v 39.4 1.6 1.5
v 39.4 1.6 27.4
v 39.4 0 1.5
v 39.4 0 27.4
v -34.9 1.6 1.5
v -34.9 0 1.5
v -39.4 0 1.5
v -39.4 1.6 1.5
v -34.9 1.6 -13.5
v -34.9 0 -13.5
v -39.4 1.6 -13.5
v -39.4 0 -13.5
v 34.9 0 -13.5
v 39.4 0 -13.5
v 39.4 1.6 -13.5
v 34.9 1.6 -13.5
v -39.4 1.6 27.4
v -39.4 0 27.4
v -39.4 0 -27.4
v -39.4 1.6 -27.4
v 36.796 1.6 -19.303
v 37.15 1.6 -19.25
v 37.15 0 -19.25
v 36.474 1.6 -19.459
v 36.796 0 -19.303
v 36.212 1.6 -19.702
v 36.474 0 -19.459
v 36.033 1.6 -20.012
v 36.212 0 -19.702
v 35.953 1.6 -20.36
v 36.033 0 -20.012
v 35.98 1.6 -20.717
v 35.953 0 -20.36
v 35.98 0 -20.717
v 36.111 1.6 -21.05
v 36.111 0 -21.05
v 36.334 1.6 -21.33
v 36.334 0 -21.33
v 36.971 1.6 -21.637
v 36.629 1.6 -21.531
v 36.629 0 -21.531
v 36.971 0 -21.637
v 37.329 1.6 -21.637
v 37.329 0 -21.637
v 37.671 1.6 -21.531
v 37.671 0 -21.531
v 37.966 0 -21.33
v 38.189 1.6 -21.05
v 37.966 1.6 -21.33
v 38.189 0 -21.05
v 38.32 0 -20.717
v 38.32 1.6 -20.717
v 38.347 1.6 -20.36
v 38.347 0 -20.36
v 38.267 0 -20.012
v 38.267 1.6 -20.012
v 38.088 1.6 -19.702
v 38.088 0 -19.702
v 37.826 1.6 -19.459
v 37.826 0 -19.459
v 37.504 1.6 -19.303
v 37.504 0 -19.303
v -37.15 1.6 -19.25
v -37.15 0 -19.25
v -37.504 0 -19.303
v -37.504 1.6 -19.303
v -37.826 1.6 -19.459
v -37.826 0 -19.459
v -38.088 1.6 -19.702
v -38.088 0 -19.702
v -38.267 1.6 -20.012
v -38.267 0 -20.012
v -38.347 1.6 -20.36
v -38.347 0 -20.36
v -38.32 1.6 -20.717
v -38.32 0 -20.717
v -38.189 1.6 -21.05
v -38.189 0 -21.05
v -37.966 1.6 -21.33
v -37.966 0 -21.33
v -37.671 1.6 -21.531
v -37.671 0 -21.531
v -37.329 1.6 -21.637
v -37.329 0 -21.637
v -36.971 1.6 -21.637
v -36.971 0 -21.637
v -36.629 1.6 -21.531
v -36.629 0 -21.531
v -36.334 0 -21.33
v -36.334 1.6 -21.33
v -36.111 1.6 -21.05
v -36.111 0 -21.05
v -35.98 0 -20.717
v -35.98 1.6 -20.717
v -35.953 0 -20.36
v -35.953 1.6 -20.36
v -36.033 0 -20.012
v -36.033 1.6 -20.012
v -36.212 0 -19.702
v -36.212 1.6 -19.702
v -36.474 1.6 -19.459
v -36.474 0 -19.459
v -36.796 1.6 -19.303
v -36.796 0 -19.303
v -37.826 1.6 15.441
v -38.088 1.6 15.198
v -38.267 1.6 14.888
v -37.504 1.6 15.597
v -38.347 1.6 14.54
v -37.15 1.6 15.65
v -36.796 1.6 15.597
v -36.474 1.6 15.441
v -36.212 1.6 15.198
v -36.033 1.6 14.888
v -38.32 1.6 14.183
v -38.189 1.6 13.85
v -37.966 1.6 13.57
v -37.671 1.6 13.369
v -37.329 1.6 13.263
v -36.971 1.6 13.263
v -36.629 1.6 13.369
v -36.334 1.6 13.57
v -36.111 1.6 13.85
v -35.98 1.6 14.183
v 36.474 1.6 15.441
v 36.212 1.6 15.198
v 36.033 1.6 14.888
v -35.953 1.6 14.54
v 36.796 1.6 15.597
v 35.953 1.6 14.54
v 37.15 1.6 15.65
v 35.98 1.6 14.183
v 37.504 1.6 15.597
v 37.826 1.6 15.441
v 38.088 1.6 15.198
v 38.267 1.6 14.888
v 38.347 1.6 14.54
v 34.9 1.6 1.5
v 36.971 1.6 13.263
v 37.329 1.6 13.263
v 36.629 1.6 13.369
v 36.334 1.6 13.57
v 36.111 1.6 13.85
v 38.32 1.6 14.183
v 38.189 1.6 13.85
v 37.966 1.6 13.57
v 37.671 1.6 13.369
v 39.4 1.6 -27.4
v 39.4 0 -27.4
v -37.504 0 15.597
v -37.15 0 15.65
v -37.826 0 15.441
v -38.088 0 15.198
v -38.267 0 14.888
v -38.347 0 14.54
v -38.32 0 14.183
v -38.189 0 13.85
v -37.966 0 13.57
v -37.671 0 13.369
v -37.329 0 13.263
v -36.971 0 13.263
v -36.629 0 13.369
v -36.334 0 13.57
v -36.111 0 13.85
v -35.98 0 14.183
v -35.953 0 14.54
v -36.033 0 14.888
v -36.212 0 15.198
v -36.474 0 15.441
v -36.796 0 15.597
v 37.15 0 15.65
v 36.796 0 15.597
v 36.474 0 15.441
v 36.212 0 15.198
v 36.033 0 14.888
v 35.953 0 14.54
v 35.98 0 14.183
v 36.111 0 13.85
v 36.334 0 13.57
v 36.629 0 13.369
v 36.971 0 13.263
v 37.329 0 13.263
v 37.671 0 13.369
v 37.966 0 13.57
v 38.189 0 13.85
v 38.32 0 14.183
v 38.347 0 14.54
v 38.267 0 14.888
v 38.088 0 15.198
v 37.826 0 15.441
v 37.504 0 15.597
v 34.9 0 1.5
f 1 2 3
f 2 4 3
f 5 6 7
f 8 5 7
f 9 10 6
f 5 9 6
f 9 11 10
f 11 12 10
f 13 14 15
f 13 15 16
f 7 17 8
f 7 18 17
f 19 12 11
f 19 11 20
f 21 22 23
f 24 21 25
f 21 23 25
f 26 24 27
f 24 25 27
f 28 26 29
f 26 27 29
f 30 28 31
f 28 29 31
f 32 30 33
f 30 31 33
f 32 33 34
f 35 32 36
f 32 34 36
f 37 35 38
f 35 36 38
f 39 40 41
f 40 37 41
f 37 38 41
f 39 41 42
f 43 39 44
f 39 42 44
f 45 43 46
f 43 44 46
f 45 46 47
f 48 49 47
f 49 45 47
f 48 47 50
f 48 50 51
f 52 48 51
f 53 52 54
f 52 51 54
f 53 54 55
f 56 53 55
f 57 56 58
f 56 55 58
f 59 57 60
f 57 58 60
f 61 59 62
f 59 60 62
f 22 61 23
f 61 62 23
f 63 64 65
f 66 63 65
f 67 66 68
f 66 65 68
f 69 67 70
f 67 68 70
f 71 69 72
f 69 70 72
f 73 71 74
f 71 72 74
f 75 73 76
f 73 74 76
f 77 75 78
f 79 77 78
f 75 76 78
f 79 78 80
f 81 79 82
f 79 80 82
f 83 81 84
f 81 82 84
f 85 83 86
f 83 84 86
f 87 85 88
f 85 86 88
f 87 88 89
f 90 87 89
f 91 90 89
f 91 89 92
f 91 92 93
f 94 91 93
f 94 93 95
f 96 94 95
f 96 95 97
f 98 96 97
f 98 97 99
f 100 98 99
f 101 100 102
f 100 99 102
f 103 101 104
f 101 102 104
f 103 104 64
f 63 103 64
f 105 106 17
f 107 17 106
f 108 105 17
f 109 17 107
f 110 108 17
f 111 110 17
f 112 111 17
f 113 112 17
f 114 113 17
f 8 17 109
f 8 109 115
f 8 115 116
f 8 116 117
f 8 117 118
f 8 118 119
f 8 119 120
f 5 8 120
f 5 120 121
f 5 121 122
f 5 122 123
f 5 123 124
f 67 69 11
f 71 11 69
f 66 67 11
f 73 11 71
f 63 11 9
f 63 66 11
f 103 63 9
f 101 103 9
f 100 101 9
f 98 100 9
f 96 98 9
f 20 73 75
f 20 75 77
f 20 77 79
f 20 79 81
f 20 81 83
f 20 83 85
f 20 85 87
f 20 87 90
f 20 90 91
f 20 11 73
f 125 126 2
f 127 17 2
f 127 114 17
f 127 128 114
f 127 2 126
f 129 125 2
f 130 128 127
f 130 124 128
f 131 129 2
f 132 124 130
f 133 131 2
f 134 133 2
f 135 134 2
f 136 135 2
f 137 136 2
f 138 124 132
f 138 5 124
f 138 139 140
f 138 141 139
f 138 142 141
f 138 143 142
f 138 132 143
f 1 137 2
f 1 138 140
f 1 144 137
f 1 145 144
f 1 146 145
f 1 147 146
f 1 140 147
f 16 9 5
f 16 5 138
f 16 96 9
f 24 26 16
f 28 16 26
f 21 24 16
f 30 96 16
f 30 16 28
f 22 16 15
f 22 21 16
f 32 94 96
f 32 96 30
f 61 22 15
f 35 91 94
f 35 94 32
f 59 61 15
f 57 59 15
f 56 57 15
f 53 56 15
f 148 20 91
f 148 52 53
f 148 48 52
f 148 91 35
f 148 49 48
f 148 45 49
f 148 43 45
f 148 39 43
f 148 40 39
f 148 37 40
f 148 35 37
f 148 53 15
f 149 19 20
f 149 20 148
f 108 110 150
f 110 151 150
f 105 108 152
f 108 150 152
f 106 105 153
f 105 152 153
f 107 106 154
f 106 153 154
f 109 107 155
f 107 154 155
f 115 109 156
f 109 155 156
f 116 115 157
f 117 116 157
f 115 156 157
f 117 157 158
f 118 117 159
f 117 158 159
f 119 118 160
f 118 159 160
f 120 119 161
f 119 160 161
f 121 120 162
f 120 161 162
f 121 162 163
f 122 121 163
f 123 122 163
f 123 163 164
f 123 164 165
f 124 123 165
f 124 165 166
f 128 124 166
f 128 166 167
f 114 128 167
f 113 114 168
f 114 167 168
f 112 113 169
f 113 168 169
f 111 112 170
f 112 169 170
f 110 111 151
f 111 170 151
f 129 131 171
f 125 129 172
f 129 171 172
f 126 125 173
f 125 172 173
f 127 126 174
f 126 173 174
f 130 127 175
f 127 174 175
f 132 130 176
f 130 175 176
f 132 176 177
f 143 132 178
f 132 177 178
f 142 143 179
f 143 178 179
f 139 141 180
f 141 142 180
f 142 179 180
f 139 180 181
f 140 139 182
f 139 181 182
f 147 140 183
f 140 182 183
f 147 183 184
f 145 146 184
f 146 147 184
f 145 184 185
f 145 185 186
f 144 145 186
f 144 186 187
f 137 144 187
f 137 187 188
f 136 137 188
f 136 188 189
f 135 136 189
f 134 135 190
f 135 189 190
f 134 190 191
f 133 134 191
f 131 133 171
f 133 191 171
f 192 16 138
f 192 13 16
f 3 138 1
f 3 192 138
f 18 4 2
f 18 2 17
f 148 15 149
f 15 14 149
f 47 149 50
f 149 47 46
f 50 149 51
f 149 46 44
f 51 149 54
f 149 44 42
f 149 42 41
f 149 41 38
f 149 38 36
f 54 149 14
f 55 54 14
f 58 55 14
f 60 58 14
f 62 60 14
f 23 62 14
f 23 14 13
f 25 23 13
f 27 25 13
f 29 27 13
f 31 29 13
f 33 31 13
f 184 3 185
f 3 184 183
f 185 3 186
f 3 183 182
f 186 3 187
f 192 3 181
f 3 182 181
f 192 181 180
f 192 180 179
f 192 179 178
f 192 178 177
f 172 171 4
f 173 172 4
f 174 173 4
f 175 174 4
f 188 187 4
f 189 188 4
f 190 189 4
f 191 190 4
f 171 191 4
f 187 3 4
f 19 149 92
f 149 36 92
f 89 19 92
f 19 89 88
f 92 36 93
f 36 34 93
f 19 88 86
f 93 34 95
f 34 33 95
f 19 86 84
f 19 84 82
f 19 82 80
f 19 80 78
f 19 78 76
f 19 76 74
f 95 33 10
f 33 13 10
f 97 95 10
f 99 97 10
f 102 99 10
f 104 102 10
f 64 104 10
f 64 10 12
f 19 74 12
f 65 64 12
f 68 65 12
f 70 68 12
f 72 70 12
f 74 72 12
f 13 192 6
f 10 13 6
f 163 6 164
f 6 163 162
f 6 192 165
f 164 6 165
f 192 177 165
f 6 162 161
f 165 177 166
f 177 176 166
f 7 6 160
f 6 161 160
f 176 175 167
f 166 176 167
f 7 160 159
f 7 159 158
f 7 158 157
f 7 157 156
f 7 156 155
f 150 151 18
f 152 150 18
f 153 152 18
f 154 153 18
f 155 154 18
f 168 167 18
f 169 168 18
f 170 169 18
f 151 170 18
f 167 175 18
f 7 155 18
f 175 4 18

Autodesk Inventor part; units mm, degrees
ref_plane "YZ Plane" through (0, 0, 0) normal (1, 0, 0) x (0, 1, 0)
ref_plane "XZ Plane" through (0, 0, 0) normal (0, 1, 0) x (-1, 0, 0)
ref_plane "XY Plane" through (0, 0, 0) normal (0, 0, 1) x (1, 0, 0)
sketch "スケッチ1" plane through (0, 0, 0) normal (0, 1, 0) x (-1, 0, 0)
  line L0 (39.4, -27.4) -> (0, -27.4)
  line L1 (0, -27.4) -> (0, 27.4)
  line L2 (0, 27.4) -> (39.4, 27.4)
  line L3 (39.4, -13.5) -> (34.9, -13.5)
  line L4 (34.9, -13.5) -> (34.9, 1.5)
  line L5 (34.9, 1.5) -> (39.4, 1.5)
  line L6 (39.4, 1.5) -> (39.4, -13.5) construction
  line L7 (39.4, 27.4) -> (39.4, 1.5)
  line L8 (39.4, -13.5) -> (39.4, -27.4)
  line L9 (0, -22.4) -> (15, -22.4)
  line L10 (15, -22.4) -> (15, -2.4)
  line L11 (15, -2.4) -> (0, -2.4)
  line L12 (-39.4, -27.4) -> (0, -27.4)
  line L13 (0, 27.4) -> (-39.4, 27.4)
  line L14 (-39.4, -13.5) -> (-34.9, -13.5)
  line L15 (-34.9, -13.5) -> (-34.9, 1.5)
  line L16 (-34.9, 1.5) -> (-39.4, 1.5)
  line L17 (-39.4, 1.5) -> (-39.4, -13.5) construction
  line L18 (-39.4, 27.4) -> (-39.4, 1.5)
  line L19 (-39.4, -13.5) -> (-39.4, -27.4)
  line L20 (0, -22.4) -> (-15, -22.4)
  line L21 (-15, -22.4) -> (-15, -2.4)
  line L22 (-15, -2.4) -> (0, -2.4)
  point P0 (0, 0)
  point P1 (0, 0)
  point P2 (0, 0)
  dimension "d0" = 13.9
  dimension "d1" = 25.9
  dimension "d2" = 39.4
  dimension "d3" = 15
  dimension "d4" = 4.5
  dimension "d5" = 20
  dimension "d6" = 15
  dimension "d7" = 5
extrude "押し出し1" add sketch "スケッチ1" along normal blind 1.6 contours L0 L1 L9 L10 L11 L2 L7 L5 L4 L3 L8 | L12 L19 L14 L15 L16 L18 L13 L1 L22 L21 L20
sketch "スケッチ2" plane through (0, 1.6, 0) normal (0, 1, 0) x (1, 0, 0)
  line L0 (-39.4, 13.5) -> (-34.9, 13.5) projected
  line L1 (-37.15, 13.5) -> (-37.15, 27.4) construction
  line L2 (-34.9, -1.5) -> (-39.4, -1.5) projected
  line L3 (-37.15, -1.5) -> (-37.15, -27.4) construction
  line L4 (-39.4, -27.4) -> (39.4, -27.4) projected
  line L5 (39.4, 27.4) -> (-39.4, 27.4) projected
  point P0 (0, 0)
  point P1 (-37.15, 20.45)
  point P2 (-37.15, -14.45)
hole "穴1" at (-37.15, 1.6, -20.45) at (-37.15, 1.6, 14.45) direction (0, -1, 0) diameter 2.4 end through all clearance for "Countersunk Flat Head Screw ISO 2009/7046" size "M2" standard "ISO"
ref_plane "作業平面1" through (0, 0, -13.5) normal (-1, 0, 0) x (0, 0, 1)
mirror "ミラー1" about plane through (0, 0, -13.5) normal (-1, 0, 0) of "穴1"
sketch "スケッチ3" plane through (0, 1.6, 0) normal (0, 1, 0) x (1, 0, 0)
  line L0 (15, 22.4) -> (15, 2.4) projected
  line L1 (-15, 22.4) -> (15, 22.4)
  line L2 (15, 22.4) -> (15, 2.4)
  line L3 (15, 2.4) -> (-15, 2.4)
  line L4 (-15, 2.4) -> (-15, 22.4)
  point P0 (0, 0)
extrude "押し出し2" add sketch "スケッチ3" against normal up to surface (1.6 mm away)
properties part number "top" material "エポキシ樹脂"
